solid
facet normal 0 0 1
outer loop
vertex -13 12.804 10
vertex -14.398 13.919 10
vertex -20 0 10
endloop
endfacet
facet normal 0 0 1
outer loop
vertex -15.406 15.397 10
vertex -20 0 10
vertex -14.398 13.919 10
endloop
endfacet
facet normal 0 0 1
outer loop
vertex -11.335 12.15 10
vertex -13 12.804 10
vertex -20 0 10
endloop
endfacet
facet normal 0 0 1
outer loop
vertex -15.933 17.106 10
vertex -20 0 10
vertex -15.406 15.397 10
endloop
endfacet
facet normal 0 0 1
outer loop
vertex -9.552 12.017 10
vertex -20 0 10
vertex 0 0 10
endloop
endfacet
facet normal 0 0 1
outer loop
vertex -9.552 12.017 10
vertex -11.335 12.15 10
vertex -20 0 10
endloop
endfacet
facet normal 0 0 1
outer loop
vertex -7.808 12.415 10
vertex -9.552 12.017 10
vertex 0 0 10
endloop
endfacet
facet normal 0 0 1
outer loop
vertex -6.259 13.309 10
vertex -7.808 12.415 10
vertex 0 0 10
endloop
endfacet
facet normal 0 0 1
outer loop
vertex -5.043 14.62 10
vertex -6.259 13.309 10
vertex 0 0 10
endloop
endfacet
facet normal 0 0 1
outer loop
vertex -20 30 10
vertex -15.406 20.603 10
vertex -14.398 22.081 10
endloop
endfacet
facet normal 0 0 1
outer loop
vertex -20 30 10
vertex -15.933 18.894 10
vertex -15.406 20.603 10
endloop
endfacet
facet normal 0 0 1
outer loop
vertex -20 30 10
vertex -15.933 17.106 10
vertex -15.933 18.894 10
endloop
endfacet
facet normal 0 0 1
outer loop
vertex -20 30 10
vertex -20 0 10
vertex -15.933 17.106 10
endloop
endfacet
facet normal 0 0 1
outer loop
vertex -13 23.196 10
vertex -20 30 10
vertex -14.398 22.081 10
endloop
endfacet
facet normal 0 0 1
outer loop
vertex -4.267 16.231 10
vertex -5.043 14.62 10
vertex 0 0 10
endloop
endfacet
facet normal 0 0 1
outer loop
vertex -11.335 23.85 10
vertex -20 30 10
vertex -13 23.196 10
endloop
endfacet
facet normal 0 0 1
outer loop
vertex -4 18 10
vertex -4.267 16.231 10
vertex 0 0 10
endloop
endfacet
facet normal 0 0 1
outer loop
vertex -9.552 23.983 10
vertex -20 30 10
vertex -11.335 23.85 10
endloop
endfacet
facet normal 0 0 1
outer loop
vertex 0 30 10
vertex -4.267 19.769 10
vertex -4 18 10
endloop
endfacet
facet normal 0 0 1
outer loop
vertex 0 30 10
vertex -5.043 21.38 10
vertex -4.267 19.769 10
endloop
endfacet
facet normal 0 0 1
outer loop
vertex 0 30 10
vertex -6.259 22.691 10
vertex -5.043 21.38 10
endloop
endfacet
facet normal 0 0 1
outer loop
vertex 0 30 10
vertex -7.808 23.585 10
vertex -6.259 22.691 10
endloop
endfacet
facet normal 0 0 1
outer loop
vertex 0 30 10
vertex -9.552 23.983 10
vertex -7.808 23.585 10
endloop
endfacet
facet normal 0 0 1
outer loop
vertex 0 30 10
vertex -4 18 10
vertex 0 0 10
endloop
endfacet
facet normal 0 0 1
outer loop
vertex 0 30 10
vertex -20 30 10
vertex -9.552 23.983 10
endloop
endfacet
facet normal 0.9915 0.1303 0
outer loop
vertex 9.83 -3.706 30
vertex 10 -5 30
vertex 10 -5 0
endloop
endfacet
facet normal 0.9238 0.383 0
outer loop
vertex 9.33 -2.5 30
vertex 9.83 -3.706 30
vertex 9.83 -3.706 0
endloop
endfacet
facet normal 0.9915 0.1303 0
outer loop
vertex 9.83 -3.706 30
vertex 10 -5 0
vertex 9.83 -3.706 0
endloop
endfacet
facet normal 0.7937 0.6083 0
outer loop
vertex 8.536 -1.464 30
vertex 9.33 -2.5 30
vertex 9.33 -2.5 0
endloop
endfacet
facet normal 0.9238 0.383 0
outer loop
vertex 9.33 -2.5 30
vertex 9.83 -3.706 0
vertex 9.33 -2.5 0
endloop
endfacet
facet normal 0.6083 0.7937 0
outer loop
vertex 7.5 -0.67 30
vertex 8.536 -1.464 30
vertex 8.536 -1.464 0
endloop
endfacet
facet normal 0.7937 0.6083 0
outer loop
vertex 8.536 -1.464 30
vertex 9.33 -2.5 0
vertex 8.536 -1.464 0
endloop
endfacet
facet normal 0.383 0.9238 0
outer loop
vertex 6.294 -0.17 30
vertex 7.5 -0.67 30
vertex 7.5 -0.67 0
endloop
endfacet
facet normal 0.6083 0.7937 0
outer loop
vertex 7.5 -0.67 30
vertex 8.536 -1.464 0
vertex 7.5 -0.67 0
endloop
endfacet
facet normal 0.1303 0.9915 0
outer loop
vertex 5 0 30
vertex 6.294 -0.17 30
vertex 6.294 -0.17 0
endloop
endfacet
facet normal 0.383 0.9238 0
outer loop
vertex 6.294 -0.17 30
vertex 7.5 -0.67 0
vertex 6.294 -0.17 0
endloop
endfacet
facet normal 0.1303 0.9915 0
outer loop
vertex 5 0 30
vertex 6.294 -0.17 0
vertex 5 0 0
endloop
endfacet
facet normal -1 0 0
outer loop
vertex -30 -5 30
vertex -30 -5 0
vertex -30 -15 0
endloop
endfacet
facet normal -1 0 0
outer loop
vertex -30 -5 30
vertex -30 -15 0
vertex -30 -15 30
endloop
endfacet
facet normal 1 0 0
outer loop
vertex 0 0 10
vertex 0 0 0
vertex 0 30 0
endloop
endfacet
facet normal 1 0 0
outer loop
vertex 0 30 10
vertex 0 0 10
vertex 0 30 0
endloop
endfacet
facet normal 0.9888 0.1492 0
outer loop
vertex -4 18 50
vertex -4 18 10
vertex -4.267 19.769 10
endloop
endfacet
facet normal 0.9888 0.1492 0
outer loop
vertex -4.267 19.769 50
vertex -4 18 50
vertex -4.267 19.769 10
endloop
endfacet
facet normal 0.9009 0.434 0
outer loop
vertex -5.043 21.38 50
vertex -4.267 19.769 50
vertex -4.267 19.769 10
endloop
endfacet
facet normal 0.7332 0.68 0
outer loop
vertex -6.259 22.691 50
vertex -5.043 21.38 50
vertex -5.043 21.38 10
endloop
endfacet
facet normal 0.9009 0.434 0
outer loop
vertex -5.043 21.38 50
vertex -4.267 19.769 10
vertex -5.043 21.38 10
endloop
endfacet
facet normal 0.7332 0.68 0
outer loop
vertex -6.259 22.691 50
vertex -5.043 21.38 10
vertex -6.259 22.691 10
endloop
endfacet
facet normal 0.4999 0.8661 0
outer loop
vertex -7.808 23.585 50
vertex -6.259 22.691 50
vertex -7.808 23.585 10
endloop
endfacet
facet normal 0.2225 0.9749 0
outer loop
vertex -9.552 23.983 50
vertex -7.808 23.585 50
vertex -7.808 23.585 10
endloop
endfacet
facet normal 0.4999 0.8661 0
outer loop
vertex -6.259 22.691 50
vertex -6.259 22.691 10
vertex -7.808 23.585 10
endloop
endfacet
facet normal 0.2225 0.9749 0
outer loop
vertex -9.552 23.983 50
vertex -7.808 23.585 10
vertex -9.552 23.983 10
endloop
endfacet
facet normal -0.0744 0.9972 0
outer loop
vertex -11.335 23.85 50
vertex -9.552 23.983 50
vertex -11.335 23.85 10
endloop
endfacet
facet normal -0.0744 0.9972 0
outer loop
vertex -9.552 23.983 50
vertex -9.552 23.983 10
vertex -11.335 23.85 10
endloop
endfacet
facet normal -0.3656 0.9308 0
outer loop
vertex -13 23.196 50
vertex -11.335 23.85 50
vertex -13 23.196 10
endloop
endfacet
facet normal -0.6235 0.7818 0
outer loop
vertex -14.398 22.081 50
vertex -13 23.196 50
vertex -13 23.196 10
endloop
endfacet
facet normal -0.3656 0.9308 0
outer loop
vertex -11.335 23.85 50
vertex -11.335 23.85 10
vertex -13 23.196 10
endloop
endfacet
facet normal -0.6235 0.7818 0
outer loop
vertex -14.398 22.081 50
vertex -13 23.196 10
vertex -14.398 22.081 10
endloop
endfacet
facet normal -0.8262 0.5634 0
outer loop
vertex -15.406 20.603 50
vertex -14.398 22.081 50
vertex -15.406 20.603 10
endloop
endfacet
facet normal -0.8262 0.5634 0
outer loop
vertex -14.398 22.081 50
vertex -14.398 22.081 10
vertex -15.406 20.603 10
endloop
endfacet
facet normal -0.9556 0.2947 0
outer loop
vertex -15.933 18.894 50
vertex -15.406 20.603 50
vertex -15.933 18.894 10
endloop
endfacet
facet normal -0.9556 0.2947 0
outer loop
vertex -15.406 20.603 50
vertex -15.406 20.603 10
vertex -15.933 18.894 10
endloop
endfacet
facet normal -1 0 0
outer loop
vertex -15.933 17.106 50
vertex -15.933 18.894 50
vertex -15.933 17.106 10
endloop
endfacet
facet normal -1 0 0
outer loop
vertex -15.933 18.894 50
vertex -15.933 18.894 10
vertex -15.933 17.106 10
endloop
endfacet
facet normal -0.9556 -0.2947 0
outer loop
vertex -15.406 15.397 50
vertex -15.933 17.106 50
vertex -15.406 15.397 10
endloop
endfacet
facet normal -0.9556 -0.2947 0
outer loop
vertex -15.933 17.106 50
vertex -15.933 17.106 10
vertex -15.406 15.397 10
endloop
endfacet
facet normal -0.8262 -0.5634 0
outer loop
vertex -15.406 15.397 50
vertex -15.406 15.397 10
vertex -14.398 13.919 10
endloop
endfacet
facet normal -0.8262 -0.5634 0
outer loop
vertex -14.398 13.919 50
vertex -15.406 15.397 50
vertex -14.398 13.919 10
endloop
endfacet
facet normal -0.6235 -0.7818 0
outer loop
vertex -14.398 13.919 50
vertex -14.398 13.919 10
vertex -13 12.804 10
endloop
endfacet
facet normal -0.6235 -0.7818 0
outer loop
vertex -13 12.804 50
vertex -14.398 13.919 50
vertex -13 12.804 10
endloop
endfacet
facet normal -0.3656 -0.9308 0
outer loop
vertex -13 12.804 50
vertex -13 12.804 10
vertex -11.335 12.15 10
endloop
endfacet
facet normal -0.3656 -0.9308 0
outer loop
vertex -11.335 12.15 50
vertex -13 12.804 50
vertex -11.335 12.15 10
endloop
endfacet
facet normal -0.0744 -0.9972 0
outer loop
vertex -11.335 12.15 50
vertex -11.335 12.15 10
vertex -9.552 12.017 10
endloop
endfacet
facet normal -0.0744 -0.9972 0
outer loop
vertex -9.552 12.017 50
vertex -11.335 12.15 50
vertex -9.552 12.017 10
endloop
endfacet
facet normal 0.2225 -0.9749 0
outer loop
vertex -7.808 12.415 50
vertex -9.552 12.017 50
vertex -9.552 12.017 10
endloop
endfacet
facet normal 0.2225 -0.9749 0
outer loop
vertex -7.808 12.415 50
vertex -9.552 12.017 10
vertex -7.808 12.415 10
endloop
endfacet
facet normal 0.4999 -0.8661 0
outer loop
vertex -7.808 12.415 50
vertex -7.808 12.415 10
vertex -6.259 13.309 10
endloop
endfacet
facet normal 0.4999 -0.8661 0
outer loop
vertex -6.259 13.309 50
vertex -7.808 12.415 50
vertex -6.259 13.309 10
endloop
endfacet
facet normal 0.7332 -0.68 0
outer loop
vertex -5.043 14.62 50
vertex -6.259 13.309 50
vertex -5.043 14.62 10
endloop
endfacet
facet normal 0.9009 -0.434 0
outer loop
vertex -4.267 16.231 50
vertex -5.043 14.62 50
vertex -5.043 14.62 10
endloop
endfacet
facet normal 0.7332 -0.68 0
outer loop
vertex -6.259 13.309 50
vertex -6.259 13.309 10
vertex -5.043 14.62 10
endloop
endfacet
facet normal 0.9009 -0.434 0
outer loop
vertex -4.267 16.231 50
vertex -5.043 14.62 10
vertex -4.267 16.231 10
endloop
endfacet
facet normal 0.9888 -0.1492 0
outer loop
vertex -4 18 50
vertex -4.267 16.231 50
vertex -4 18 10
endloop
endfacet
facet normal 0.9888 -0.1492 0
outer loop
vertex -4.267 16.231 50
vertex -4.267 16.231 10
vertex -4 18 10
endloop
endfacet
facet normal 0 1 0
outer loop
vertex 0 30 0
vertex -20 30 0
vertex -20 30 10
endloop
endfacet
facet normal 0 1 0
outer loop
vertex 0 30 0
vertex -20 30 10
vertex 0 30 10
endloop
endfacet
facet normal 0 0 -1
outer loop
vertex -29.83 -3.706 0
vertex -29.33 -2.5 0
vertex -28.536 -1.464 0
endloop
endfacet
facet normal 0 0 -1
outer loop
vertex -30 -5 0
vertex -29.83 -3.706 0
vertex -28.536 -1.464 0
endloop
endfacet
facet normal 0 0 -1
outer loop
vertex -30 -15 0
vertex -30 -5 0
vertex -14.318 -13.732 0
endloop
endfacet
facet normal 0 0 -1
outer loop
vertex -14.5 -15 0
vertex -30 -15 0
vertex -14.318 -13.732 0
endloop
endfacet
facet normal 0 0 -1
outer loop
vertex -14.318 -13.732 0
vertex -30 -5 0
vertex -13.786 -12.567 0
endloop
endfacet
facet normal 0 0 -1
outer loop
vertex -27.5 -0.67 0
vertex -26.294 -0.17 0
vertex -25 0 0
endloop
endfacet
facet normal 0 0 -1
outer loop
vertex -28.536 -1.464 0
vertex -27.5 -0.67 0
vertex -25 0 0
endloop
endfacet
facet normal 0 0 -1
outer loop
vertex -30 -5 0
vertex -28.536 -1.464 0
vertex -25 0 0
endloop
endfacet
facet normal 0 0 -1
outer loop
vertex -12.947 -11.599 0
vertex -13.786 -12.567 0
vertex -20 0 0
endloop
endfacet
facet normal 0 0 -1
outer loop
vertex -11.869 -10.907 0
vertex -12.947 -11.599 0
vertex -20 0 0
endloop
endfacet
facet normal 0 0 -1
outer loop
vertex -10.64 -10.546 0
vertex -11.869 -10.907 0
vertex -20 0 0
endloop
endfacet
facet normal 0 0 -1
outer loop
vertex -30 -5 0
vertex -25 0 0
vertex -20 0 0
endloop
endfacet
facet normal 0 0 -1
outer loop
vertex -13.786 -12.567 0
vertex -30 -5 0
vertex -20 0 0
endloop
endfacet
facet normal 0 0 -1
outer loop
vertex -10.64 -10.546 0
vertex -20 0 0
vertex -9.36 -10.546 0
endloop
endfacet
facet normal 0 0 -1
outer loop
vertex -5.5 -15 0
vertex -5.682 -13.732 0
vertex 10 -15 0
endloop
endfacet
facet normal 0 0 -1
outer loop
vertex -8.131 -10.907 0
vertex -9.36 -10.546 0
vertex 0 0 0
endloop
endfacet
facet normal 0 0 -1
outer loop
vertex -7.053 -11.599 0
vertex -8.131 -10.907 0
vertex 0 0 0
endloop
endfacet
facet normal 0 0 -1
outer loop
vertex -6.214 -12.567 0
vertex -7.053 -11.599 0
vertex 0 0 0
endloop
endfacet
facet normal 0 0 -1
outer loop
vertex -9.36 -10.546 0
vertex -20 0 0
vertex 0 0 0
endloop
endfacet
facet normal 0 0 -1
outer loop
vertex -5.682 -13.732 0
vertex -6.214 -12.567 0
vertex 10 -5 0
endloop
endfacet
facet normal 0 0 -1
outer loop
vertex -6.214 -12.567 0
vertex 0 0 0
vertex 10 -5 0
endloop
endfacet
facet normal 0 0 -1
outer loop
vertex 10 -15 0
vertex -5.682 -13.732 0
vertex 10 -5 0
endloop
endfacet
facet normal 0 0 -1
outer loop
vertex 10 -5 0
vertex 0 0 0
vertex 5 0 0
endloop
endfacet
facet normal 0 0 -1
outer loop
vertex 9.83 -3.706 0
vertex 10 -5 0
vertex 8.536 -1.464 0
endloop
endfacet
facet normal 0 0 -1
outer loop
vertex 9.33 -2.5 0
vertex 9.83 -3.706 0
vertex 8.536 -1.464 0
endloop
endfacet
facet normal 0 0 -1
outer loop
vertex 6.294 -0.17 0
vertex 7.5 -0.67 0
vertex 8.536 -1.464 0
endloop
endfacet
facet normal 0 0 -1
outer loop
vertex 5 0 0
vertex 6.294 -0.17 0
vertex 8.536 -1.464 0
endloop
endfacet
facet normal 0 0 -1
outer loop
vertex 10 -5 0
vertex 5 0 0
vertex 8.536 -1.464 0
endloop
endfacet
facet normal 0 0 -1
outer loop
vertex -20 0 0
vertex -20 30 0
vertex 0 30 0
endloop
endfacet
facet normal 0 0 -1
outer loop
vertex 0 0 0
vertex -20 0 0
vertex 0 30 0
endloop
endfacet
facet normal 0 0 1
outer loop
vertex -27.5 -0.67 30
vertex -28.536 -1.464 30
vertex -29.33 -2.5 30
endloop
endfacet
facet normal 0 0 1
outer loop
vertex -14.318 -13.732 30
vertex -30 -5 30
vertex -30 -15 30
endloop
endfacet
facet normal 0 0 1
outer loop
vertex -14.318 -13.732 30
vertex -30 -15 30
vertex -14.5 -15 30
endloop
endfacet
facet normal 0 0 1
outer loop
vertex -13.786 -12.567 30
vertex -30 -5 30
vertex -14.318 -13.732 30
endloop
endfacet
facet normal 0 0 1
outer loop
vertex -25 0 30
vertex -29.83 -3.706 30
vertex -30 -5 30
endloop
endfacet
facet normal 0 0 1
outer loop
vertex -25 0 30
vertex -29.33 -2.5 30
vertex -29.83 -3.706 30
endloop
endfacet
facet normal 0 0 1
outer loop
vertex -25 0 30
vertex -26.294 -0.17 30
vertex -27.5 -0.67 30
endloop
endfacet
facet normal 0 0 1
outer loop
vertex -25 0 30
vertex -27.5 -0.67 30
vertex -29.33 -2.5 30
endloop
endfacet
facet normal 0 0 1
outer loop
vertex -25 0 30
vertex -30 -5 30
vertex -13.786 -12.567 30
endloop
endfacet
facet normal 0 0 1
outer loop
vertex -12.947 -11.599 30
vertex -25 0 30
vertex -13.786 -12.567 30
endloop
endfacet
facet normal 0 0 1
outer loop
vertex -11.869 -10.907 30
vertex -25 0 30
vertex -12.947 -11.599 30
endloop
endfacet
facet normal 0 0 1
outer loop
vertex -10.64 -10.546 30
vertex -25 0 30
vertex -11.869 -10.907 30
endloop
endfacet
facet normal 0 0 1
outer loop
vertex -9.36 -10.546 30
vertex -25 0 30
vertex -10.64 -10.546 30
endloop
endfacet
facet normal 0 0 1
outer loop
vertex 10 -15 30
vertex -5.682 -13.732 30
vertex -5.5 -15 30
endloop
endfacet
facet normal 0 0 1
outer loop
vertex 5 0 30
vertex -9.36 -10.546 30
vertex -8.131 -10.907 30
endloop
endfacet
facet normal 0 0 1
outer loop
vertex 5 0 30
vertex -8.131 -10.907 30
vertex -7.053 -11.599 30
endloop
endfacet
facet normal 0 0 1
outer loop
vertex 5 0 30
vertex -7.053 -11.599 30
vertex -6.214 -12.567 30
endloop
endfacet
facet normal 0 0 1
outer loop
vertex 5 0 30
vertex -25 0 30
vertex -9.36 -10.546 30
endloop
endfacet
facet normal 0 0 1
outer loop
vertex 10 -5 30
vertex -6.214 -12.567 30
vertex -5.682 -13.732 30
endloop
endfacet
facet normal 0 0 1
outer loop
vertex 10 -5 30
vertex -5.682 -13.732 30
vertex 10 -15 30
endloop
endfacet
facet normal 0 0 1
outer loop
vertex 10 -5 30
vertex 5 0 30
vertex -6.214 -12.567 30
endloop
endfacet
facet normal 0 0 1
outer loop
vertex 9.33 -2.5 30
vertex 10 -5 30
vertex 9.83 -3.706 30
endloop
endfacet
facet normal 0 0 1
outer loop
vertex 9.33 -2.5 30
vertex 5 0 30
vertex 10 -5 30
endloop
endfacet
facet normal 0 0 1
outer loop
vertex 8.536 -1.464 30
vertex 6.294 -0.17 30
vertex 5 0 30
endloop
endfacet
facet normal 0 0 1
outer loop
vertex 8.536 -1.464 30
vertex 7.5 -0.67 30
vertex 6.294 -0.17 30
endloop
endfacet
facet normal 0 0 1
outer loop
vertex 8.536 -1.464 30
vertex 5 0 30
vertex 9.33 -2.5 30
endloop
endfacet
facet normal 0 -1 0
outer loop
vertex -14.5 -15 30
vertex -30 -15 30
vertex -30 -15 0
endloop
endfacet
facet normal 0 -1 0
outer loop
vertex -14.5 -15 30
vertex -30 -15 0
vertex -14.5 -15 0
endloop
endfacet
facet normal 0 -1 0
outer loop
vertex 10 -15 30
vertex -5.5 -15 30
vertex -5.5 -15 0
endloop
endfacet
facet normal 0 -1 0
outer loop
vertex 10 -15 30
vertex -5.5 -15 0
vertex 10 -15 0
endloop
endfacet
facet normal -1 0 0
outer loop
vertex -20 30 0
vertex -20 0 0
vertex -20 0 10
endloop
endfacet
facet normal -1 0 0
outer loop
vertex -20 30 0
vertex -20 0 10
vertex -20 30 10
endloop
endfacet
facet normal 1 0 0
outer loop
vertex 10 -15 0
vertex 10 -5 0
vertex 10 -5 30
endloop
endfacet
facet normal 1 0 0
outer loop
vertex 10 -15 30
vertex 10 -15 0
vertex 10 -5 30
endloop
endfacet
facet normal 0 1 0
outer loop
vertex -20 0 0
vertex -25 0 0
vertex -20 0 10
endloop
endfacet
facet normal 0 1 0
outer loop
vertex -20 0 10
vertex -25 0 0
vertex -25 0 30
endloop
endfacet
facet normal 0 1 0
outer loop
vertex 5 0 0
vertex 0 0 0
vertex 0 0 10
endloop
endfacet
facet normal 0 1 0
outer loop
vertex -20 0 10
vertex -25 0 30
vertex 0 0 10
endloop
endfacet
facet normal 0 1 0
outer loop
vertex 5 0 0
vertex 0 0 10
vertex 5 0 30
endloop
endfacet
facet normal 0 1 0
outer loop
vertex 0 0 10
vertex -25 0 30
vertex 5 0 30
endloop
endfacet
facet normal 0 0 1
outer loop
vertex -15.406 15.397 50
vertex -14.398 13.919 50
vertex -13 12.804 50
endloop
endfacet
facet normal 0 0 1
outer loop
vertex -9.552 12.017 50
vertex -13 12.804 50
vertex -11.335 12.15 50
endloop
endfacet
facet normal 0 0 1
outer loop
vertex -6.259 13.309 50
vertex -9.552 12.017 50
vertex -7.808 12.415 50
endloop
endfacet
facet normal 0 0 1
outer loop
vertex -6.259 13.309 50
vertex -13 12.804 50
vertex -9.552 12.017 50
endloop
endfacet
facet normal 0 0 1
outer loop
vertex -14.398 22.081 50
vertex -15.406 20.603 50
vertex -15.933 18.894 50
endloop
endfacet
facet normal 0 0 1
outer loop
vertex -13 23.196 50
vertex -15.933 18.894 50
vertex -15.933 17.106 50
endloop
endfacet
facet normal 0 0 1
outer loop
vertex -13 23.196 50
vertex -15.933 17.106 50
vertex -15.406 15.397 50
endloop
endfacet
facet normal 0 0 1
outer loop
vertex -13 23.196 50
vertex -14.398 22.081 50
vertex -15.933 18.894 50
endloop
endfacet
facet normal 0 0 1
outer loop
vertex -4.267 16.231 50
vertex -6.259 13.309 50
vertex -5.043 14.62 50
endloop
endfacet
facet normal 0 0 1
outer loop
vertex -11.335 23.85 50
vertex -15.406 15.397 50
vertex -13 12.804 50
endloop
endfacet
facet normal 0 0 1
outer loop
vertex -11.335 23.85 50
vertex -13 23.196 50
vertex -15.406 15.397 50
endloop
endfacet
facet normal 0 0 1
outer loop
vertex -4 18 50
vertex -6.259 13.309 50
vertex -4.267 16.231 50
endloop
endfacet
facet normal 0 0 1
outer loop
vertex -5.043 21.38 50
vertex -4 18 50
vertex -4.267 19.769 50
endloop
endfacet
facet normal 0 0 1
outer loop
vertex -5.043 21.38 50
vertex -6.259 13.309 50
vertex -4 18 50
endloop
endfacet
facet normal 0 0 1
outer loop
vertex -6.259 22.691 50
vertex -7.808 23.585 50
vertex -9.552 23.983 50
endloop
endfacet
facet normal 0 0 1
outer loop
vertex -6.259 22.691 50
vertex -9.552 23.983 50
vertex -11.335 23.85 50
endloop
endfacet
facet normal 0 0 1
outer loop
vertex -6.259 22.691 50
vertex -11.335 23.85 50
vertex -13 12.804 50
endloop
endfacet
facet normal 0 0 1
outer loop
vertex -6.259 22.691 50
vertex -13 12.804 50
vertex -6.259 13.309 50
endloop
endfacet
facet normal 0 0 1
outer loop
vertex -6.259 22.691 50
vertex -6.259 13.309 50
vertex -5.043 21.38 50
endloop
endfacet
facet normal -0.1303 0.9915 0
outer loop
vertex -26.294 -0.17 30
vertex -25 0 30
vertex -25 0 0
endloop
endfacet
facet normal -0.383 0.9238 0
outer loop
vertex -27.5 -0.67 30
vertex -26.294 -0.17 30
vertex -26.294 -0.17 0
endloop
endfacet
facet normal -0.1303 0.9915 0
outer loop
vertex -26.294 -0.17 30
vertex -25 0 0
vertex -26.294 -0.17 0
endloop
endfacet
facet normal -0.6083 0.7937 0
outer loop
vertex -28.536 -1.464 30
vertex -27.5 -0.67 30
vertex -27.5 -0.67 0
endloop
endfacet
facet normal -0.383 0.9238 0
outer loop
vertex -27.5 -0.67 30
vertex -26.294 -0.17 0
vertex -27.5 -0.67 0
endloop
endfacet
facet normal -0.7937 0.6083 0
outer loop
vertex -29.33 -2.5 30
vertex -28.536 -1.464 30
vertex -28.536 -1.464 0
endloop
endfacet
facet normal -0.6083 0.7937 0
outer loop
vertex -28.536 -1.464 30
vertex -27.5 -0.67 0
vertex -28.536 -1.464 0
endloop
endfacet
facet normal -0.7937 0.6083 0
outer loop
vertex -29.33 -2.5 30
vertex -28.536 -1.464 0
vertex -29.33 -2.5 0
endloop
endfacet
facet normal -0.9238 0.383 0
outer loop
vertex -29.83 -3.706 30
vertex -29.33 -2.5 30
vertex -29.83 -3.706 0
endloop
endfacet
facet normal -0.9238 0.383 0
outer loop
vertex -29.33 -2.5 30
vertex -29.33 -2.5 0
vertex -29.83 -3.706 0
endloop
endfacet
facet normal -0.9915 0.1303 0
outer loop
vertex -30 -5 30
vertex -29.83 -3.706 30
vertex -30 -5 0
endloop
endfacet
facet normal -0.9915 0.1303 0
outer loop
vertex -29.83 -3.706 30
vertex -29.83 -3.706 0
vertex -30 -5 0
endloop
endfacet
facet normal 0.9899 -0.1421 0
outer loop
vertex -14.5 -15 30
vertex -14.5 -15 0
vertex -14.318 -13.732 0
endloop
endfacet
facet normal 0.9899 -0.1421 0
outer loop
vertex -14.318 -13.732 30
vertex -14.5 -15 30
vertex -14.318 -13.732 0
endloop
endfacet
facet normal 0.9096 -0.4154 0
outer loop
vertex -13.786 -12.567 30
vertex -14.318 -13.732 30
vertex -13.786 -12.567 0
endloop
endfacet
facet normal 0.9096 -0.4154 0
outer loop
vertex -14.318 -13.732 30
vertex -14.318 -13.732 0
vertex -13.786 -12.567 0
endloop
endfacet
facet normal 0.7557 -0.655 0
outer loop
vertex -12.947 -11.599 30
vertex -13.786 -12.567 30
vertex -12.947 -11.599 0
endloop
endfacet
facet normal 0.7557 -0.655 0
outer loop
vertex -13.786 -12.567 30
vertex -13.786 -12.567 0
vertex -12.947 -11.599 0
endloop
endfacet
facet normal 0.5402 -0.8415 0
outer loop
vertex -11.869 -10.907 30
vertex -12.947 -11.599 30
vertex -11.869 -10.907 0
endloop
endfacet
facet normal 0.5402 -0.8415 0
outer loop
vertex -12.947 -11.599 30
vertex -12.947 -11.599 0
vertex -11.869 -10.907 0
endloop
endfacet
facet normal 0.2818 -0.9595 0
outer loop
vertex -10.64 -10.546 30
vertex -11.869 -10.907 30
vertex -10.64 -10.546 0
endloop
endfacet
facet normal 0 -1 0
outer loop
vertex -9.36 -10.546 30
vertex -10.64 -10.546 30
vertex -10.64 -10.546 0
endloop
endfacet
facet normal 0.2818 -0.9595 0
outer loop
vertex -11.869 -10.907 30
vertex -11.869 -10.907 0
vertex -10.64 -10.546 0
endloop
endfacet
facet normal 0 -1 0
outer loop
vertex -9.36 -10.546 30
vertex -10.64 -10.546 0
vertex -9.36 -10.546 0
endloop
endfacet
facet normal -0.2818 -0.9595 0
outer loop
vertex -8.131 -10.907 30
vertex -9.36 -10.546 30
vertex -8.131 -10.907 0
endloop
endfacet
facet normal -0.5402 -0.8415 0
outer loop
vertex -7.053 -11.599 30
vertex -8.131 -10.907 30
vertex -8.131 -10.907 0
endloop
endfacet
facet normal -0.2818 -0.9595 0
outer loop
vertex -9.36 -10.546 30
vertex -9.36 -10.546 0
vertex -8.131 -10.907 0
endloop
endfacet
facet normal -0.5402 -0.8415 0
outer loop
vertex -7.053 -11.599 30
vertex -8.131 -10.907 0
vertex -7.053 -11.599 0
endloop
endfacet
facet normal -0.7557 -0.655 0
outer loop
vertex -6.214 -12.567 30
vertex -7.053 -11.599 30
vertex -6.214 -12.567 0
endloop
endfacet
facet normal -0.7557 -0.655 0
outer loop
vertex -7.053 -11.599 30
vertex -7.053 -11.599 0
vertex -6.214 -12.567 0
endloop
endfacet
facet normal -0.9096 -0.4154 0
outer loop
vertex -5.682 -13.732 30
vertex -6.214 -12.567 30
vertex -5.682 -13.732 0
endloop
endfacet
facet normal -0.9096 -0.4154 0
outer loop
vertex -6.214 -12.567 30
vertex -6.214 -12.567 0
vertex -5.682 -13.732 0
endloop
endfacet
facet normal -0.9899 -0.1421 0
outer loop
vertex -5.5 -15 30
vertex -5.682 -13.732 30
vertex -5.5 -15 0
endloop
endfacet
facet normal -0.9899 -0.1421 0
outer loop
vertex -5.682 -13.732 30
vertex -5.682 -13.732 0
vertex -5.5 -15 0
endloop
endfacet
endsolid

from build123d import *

# Parameters (mm, degrees)
ESQUISSE1_W             = 20
ESQUISSE1_H             = 30
BOSS_EXTRU_1_DEPTH      = 10
ESQUISSE2_R             = 6
BOSS_EXTRU_2_DEPTH      = 40
ESQUISSE3_W             = 40
ESQUISSE3_H             = 30
BOSS_EXTRU_3_DEPTH      = 15
ESQUISSE4_R             = 4.5
ENL_V_MAT_EXTRU_1_DEPTH = 55
ENL_V_MAT_EXTRU_3_DEPTH = 55


with BuildPart() as part:
    # Esquisse1 → Boss.-Extru.1 (new body)
    with BuildSketch(Plane.XY):
        with Locations((-10, 15)):
            Rectangle(ESQUISSE1_W, ESQUISSE1_H)
    extrude(amount=BOSS_EXTRU_1_DEPTH)

    # Esquisse2 → Boss.-Extru.2 (add)
    with BuildSketch(Plane.XY.offset(10)):
        with Locations((-10, 18)):
            Circle(ESQUISSE2_R)
    extrude(amount=BOSS_EXTRU_2_DEPTH)

    # Esquisse3 → Boss.-Extru.3 (add)
    with BuildSketch(Plane.XZ):
        with Locations((-10, 15)):
            Rectangle(ESQUISSE3_W, ESQUISSE3_H)
    extrude(amount=BOSS_EXTRU_3_DEPTH)

    # Esquisse4 → Enlèv. mat.-Extru.1 (cut)
    with BuildSketch(Plane(origin=(0, 0, 0), x_dir=(-1, 0, 0), z_dir=(0, 0, -1))):
        with Locations((10, -15)):
            Circle(ESQUISSE4_R)
    extrude(amount=-ENL_V_MAT_EXTRU_1_DEPTH, mode=Mode.SUBTRACT)

    # Esquisse5 → Enlèv. mat.-Extru.3 (cut)
    with BuildSketch(Plane(origin=(0, 0, 0), x_dir=(-1, 0, 0), z_dir=(0, 0, -1))):
        with BuildLine():
            Line((30, 0), (25, 0))
            ThreePointArc((25, 0), (28.535533906, -1.464466094), (30, -5))
            Line((30, -5), (30, 0))
        make_face()
        with BuildLine():
            Line((-10, 0), (-10, -5))
            ThreePointArc((-10, -5), (-8.535533906, -1.464466094), (-5, 0))
            Line((-5, 0), (-10, 0))
        make_face()
    extrude(amount=-ENL_V_MAT_EXTRU_3_DEPTH, mode=Mode.SUBTRACT)


solid = part.part
